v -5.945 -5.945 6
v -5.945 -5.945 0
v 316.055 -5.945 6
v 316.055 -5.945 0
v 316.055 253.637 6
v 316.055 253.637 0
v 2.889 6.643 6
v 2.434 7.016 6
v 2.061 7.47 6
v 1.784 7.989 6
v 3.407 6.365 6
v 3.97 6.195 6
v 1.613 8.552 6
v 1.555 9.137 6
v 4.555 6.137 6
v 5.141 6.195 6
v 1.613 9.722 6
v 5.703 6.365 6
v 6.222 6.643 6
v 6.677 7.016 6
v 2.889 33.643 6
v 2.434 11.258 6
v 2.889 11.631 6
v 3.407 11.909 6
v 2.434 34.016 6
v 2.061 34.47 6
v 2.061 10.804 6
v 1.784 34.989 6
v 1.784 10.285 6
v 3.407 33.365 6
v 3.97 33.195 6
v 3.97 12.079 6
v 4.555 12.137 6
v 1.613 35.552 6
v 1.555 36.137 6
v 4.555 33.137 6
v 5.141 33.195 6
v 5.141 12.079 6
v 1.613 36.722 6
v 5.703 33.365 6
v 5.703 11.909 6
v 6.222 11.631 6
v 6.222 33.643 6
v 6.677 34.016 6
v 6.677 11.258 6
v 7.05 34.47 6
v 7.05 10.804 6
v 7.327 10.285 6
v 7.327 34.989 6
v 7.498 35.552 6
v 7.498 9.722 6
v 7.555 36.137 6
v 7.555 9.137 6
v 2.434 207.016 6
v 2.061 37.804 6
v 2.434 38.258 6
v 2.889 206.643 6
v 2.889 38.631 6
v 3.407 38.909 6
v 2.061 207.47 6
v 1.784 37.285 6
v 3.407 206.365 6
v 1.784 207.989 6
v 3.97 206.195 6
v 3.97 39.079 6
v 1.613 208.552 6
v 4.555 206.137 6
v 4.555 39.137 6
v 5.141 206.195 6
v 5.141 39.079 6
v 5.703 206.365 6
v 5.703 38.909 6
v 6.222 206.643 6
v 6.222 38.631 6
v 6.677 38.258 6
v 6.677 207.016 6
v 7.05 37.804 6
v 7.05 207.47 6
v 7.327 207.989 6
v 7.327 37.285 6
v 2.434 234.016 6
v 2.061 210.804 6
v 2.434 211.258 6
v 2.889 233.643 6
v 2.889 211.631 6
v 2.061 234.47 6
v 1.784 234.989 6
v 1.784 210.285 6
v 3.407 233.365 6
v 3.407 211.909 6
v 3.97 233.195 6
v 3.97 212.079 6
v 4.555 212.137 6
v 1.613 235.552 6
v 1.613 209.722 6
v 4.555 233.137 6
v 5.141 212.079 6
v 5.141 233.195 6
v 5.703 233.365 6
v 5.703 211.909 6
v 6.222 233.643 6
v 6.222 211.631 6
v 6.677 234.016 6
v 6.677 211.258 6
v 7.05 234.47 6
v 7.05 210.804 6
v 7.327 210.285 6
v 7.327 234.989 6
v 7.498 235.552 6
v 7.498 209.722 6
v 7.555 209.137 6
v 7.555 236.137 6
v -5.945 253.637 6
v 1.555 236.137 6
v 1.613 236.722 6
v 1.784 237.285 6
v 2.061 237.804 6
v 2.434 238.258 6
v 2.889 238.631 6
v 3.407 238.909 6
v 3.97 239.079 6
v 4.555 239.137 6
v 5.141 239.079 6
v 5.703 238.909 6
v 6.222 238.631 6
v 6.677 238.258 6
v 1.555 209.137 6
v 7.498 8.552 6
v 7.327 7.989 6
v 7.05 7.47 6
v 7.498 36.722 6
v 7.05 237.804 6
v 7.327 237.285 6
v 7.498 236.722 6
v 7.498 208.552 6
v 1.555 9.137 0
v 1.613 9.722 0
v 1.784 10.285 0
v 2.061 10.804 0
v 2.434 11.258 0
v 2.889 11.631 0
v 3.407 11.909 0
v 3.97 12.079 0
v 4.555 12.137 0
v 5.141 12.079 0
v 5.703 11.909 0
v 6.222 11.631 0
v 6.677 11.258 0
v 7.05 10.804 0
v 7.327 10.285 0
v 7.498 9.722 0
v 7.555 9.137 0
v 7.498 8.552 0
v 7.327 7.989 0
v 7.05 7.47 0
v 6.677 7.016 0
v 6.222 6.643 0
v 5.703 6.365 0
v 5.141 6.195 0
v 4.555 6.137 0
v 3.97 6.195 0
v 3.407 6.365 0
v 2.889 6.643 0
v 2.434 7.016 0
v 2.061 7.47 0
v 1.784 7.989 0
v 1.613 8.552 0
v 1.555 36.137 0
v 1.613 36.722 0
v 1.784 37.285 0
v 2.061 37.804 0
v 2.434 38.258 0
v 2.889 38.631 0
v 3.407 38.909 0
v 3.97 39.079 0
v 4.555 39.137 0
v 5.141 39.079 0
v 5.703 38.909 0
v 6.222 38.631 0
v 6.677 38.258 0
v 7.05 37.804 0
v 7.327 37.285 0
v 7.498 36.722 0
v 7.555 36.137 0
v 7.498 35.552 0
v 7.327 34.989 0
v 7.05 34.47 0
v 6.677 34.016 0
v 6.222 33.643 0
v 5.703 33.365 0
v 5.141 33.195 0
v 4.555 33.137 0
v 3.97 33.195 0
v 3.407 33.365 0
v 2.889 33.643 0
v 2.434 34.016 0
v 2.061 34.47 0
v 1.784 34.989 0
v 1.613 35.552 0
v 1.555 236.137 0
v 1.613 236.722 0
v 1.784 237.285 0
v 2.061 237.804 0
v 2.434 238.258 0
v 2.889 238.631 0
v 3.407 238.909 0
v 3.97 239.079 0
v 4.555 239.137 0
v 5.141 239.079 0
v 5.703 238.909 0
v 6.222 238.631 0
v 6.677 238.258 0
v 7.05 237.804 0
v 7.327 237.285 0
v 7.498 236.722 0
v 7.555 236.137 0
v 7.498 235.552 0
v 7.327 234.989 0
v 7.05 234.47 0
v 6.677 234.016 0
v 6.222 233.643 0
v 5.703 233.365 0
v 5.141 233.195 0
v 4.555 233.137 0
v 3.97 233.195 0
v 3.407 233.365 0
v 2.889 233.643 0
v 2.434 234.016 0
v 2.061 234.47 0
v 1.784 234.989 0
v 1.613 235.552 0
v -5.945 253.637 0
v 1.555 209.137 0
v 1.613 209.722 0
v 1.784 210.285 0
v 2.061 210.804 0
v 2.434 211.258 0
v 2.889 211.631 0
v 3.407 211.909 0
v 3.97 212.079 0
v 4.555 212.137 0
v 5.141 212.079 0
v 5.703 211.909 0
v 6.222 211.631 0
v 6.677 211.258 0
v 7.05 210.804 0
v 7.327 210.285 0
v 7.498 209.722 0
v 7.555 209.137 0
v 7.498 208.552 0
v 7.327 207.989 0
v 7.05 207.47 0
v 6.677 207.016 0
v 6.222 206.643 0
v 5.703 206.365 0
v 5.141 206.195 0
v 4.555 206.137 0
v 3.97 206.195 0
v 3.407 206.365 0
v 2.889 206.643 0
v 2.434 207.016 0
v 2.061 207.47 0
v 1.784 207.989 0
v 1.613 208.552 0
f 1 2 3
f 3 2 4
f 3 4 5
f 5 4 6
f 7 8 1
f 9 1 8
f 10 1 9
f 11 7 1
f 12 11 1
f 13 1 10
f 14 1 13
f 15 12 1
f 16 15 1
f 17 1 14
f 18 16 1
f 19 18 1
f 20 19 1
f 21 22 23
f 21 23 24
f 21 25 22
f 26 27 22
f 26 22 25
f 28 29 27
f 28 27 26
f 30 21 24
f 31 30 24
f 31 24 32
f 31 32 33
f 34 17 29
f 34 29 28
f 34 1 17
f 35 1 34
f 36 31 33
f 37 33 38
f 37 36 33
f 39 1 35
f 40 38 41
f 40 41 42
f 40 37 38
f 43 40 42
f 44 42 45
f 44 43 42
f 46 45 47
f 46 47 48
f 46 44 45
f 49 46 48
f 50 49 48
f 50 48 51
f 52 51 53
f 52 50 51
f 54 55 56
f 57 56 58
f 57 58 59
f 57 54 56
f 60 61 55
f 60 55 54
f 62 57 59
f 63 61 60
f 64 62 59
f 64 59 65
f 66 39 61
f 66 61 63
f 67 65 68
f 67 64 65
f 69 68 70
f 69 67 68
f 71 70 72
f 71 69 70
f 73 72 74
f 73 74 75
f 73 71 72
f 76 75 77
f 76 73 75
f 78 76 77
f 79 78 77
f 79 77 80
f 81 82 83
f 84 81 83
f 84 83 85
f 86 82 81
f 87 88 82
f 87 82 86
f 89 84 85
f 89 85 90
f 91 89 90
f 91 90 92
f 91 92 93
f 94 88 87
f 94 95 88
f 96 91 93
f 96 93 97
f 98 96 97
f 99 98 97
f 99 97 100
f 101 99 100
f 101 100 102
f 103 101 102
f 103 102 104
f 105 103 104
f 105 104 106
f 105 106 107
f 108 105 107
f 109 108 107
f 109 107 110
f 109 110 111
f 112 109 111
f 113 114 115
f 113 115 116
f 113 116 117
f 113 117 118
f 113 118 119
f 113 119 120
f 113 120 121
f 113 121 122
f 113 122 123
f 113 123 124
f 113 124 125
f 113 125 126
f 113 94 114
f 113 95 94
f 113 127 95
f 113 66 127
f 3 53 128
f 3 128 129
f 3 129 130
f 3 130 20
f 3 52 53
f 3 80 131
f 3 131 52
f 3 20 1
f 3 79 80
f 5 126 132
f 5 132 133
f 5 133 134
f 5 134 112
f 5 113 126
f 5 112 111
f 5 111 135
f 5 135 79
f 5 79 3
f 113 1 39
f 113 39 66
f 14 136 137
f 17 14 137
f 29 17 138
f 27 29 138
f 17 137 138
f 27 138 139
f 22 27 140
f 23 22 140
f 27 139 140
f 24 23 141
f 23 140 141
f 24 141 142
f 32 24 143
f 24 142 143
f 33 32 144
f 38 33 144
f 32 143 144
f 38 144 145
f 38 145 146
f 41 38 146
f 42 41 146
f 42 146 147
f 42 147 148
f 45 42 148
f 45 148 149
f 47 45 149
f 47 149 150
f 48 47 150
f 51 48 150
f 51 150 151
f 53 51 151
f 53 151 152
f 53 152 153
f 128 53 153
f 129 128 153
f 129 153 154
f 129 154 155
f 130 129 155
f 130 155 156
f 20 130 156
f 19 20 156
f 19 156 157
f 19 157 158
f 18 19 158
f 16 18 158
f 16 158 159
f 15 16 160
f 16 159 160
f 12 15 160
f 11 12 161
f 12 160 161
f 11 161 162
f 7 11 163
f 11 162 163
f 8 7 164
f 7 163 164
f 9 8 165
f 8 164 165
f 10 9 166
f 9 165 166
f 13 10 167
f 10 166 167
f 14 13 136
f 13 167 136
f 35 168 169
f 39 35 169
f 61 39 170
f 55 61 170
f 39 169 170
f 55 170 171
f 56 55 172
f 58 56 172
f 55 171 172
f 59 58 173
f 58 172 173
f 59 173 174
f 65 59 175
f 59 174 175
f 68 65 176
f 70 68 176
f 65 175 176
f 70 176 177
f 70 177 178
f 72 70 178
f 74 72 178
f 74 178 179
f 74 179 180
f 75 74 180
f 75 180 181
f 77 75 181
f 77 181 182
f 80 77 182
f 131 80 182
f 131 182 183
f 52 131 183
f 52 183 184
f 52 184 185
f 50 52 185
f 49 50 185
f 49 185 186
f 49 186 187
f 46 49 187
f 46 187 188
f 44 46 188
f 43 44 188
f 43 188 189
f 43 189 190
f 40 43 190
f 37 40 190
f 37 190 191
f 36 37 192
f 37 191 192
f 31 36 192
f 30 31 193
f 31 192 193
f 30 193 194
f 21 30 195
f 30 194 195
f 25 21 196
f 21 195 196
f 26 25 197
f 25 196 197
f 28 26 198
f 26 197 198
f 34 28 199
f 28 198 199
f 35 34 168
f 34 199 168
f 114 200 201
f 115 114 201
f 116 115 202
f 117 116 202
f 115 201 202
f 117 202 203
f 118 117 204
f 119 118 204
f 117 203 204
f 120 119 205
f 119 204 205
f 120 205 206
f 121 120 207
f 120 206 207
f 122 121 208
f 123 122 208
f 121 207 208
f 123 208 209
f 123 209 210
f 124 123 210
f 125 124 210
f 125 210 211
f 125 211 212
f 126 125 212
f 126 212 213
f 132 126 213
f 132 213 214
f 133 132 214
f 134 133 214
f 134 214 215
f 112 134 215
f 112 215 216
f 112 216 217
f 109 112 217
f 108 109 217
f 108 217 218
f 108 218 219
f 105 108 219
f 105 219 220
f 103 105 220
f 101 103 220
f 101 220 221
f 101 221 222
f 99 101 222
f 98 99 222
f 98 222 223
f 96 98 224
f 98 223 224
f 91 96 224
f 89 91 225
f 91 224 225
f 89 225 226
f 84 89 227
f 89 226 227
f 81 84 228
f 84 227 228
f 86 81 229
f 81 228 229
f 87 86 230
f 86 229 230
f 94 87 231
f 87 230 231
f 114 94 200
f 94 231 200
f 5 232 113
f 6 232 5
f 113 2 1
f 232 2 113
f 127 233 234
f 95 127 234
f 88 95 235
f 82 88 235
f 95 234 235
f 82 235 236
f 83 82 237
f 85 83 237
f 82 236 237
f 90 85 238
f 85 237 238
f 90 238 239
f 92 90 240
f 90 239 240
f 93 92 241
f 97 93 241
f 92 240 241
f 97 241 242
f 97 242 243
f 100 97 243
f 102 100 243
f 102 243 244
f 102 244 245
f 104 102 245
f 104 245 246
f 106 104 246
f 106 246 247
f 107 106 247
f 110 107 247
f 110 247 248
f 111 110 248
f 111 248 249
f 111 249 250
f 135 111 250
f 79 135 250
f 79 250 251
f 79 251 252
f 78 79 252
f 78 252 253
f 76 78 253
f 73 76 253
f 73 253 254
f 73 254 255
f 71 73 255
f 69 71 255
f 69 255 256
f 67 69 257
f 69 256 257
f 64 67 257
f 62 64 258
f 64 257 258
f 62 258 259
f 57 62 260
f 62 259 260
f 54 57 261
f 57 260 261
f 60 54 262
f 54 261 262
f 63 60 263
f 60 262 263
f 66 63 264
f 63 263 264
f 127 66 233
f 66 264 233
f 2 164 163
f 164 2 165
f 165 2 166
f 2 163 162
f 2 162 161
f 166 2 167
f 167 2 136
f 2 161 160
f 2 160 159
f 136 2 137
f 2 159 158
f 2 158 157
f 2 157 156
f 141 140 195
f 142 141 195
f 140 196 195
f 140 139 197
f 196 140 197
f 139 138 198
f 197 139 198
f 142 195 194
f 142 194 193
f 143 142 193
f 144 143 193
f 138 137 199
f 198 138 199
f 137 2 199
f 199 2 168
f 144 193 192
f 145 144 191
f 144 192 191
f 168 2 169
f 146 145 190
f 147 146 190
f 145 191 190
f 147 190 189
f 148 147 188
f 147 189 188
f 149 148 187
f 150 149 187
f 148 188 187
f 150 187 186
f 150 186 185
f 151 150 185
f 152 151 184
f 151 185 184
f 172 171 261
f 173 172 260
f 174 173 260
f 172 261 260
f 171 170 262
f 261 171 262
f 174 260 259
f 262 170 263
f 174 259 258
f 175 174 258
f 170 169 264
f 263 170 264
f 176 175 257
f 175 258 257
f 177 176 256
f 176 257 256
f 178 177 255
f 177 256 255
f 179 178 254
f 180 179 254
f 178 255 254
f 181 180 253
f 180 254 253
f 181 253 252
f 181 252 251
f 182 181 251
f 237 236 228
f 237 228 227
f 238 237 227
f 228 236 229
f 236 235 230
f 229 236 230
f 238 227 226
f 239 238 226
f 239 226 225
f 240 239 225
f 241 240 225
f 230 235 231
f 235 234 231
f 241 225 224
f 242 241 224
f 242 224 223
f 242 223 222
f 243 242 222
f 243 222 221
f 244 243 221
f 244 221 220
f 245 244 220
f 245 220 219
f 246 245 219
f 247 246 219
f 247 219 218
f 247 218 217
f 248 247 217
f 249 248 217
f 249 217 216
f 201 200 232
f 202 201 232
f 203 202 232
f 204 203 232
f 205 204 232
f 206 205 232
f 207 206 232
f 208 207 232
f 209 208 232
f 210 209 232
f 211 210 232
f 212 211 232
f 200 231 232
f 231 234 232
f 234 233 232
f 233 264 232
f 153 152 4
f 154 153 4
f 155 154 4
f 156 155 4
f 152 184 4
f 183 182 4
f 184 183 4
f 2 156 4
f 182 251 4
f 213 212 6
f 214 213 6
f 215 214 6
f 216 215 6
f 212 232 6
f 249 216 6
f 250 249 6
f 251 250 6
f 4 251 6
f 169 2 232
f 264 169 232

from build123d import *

# Parameters (mm, degrees)
ESQUISSE1_W             = 322
ESQUISSE1_H             = 259.581538462
BOSS_EXTRU_1_DEPTH      = 6
ENL_V_MAT_EXTRU_1_REACH = 407.288
ESQUISSE2_R             = 3


with BuildPart() as part:
    # Esquisse1 → Boss.-Extru.1 (new body)
    with BuildSketch(Plane.XY):
        with Locations((155.055384615, 123.846153846)):
            Rectangle(ESQUISSE1_W, ESQUISSE1_H)
    extrude(amount=BOSS_EXTRU_1_DEPTH)

    # Esquisse2 → Enlèv. mat.-Extru.1 (cut, up to next)
    with BuildSketch(Plane(origin=(0, 0, 0), x_dir=(-1, 0, 0), z_dir=(0, 0, -1)), mode=Mode.PRIVATE) as enl_v_mat_extru_1_sk1:
        with Locations((-4.555384615, 236.136923077)):
            Circle(ESQUISSE2_R)
    enl_v_mat_extru_1_tool1 = extrude(enl_v_mat_extru_1_sk1.sketch, amount=-ENL_V_MAT_EXTRU_1_REACH, mode=Mode.PRIVATE) & part.part
    # Esquisse2 → Enlèv. mat.-Extru.1 (cut, up to next)
    with BuildSketch(Plane(origin=(0, 0, 0), x_dir=(-1, 0, 0), z_dir=(0, 0, -1)), mode=Mode.PRIVATE) as enl_v_mat_extru_1_sk2:
        with Locations((-4.555384615, 209.136923077)):
            Circle(ESQUISSE2_R)
    enl_v_mat_extru_1_tool2 = extrude(enl_v_mat_extru_1_sk2.sketch, amount=-ENL_V_MAT_EXTRU_1_REACH, mode=Mode.PRIVATE) & part.part
    # Esquisse2 → Enlèv. mat.-Extru.1 (cut, up to next)
    with BuildSketch(Plane(origin=(0, 0, 0), x_dir=(-1, 0, 0), z_dir=(0, 0, -1)), mode=Mode.PRIVATE) as enl_v_mat_extru_1_sk3:
        with Locations((-4.555384615, 36.136923077)):
            Circle(ESQUISSE2_R)
    enl_v_mat_extru_1_tool3 = extrude(enl_v_mat_extru_1_sk3.sketch, amount=-ENL_V_MAT_EXTRU_1_REACH, mode=Mode.PRIVATE) & part.part
    # Esquisse2 → Enlèv. mat.-Extru.1 (cut, up to next)
    with BuildSketch(Plane(origin=(0, 0, 0), x_dir=(-1, 0, 0), z_dir=(0, 0, -1)), mode=Mode.PRIVATE) as enl_v_mat_extru_1_sk4:
        with Locations((-4.555384615, 9.136923077)):
            Circle(ESQUISSE2_R)
    enl_v_mat_extru_1_tool4 = extrude(enl_v_mat_extru_1_sk4.sketch, amount=-ENL_V_MAT_EXTRU_1_REACH, mode=Mode.PRIVATE) & part.part
    add(enl_v_mat_extru_1_tool1.solids().sort_by_distance((4.555385, 236.136923, 0))[0], mode=Mode.SUBTRACT)
    add(enl_v_mat_extru_1_tool2.solids().sort_by_distance((4.555385, 209.136923, 0))[0], mode=Mode.SUBTRACT)
    add(enl_v_mat_extru_1_tool3.solids().sort_by_distance((4.555385, 36.136923, 0))[0], mode=Mode.SUBTRACT)
    add(enl_v_mat_extru_1_tool4.solids().sort_by_distance((4.555385, 9.136923, 0))[0], mode=Mode.SUBTRACT)


solid = part.part
